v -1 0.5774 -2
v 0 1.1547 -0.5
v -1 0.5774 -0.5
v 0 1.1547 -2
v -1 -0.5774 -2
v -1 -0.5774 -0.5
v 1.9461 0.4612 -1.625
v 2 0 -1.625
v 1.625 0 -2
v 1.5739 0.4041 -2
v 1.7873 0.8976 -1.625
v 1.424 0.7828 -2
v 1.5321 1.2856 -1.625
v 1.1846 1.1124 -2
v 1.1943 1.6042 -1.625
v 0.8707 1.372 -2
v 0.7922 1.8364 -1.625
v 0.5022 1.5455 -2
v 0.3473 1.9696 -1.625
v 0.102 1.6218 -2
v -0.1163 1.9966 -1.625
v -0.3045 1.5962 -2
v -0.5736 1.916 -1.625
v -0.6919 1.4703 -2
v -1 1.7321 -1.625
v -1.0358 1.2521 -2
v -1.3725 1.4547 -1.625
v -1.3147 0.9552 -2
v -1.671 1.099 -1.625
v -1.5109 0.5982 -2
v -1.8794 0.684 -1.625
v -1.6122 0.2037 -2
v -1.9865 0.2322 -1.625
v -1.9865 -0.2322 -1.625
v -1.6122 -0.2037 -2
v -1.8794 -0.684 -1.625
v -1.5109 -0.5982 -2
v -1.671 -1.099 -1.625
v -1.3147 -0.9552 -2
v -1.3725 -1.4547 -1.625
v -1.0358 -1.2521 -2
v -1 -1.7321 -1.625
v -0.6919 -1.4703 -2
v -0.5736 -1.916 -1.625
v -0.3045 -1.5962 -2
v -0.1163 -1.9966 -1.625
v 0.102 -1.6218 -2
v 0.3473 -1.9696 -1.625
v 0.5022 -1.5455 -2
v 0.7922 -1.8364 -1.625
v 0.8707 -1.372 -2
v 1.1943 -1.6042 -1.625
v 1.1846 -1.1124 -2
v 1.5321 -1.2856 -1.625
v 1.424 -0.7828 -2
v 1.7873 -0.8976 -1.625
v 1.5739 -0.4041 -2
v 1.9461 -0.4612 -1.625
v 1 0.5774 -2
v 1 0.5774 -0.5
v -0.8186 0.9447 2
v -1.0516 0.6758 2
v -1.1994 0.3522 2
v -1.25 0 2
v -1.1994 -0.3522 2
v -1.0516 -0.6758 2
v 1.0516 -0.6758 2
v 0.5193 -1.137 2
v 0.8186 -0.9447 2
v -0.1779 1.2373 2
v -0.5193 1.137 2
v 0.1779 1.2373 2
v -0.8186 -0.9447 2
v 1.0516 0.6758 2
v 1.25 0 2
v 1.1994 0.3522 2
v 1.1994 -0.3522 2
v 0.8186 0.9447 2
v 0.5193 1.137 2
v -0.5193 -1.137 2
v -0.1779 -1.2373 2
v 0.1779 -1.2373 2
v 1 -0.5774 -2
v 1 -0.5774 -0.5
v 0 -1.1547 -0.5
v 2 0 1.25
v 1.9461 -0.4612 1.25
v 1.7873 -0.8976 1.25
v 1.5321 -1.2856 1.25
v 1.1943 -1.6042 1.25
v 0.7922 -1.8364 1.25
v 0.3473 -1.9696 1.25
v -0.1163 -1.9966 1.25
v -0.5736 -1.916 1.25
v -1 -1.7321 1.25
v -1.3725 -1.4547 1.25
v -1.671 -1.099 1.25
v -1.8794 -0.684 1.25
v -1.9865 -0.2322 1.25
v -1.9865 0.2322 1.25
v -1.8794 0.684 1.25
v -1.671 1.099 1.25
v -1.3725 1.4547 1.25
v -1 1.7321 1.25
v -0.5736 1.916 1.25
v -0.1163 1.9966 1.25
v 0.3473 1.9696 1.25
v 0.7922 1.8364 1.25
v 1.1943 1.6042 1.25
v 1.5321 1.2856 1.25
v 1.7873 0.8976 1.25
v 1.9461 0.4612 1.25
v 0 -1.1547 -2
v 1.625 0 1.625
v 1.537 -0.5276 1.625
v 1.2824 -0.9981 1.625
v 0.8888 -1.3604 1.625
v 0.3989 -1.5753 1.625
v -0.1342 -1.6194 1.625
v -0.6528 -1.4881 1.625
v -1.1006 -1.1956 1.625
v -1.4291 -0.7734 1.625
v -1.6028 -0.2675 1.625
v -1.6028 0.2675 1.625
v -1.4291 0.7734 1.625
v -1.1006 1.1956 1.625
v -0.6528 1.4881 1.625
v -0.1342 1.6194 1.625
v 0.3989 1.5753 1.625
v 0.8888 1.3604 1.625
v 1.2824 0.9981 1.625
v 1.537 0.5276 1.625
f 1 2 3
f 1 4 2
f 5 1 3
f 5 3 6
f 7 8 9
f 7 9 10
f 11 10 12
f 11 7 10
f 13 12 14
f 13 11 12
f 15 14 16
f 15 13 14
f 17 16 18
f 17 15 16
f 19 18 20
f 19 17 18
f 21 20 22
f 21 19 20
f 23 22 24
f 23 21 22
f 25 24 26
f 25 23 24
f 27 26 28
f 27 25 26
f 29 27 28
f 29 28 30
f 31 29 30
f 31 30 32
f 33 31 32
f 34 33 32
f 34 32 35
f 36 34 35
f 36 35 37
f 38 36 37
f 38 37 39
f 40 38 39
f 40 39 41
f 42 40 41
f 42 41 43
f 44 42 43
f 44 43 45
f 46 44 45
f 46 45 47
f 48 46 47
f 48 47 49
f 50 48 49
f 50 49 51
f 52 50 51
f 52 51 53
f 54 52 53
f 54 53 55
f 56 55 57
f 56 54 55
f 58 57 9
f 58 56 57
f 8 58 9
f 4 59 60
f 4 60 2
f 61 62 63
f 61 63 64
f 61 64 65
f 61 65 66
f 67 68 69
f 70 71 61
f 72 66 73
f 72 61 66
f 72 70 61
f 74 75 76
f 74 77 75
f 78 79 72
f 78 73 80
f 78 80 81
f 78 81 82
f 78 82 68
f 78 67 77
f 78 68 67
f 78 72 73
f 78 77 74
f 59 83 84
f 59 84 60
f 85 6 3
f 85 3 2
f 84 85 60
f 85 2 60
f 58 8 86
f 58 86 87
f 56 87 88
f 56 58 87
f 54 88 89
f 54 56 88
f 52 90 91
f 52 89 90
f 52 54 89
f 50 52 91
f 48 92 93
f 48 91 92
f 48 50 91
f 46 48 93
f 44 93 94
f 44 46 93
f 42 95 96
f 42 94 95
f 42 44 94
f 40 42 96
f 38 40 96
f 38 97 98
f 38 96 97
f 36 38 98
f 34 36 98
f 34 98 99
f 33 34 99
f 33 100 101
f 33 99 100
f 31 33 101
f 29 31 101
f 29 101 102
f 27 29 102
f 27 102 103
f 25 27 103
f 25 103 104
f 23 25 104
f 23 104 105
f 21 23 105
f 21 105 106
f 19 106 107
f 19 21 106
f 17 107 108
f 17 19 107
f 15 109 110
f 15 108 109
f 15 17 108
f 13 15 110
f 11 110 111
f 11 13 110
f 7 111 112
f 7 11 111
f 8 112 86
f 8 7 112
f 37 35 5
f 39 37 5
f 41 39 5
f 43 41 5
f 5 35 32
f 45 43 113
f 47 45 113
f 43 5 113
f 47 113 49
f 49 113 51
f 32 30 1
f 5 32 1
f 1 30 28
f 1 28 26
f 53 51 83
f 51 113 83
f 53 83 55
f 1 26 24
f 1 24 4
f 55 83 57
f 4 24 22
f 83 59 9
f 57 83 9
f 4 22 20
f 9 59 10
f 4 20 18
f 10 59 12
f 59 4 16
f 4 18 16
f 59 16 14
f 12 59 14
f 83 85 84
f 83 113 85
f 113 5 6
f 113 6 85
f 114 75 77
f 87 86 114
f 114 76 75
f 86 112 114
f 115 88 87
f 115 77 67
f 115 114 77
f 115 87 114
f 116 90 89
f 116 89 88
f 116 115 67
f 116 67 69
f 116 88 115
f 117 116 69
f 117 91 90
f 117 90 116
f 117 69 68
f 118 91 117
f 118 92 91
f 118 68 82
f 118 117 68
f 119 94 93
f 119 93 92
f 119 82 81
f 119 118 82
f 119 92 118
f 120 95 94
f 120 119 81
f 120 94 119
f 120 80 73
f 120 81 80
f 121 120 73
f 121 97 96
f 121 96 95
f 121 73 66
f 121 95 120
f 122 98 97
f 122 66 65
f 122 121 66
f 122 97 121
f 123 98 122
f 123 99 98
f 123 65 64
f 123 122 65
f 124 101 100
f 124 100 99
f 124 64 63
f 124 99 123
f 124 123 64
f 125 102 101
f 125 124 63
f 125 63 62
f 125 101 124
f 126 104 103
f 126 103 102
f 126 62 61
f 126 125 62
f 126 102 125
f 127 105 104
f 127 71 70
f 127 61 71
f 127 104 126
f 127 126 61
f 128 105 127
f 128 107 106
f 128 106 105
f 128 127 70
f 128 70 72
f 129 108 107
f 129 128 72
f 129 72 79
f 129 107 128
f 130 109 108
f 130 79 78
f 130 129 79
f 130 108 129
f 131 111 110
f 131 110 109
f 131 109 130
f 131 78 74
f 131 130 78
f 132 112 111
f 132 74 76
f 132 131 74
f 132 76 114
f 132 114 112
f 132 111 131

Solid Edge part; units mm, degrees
sketch "Sketch1" plane through (0, 0, 0) normal (0, -1, 0) x (1, 0, 0)
  line L0 (0, 2) -> (2, 2)
  line L1 (2, 2) -> (2, -2)
  line L2 (2, -2) -> (0, -2)
  dimension "D1" = 4
revolve "RevolvedProtrusion1" add sketch "Sketch1" angle 360 about axis through (0, 0, -2) along (0, 0, 1)
chamfer "Chamfer1" distance 0.75 angle 45 1 edges at (-2, 0, 2)
chamfer "Chamfer_2" distance 0.375 angle 45 1 edges at (-2, 0, -2)
cosmetic_thread "Thread1" size "M4"
sketch "Sketch2" plane through (0, 0, -2) normal (0, 0, -1) x (-1, 0, 0)
  line L0 (1, 0.5774) -> (1, -0.5774)
  line L1 (1, -0.5774) -> (0, -1.1547)
  line L2 (0, -1.1547) -> (-1, -0.5774)
  line L3 (-1, -0.5774) -> (-1, 0.5774)
  line L4 (-1, 0.5774) -> (0, 1.1547)
  line L5 (0, 1.1547) -> (1, 0.5774)
  dimension "D1" = 2
extrude "ExtrudedCutout_1" cut sketch "Sketch2" against normal blind 1.5
properties material "Stainless steel"
